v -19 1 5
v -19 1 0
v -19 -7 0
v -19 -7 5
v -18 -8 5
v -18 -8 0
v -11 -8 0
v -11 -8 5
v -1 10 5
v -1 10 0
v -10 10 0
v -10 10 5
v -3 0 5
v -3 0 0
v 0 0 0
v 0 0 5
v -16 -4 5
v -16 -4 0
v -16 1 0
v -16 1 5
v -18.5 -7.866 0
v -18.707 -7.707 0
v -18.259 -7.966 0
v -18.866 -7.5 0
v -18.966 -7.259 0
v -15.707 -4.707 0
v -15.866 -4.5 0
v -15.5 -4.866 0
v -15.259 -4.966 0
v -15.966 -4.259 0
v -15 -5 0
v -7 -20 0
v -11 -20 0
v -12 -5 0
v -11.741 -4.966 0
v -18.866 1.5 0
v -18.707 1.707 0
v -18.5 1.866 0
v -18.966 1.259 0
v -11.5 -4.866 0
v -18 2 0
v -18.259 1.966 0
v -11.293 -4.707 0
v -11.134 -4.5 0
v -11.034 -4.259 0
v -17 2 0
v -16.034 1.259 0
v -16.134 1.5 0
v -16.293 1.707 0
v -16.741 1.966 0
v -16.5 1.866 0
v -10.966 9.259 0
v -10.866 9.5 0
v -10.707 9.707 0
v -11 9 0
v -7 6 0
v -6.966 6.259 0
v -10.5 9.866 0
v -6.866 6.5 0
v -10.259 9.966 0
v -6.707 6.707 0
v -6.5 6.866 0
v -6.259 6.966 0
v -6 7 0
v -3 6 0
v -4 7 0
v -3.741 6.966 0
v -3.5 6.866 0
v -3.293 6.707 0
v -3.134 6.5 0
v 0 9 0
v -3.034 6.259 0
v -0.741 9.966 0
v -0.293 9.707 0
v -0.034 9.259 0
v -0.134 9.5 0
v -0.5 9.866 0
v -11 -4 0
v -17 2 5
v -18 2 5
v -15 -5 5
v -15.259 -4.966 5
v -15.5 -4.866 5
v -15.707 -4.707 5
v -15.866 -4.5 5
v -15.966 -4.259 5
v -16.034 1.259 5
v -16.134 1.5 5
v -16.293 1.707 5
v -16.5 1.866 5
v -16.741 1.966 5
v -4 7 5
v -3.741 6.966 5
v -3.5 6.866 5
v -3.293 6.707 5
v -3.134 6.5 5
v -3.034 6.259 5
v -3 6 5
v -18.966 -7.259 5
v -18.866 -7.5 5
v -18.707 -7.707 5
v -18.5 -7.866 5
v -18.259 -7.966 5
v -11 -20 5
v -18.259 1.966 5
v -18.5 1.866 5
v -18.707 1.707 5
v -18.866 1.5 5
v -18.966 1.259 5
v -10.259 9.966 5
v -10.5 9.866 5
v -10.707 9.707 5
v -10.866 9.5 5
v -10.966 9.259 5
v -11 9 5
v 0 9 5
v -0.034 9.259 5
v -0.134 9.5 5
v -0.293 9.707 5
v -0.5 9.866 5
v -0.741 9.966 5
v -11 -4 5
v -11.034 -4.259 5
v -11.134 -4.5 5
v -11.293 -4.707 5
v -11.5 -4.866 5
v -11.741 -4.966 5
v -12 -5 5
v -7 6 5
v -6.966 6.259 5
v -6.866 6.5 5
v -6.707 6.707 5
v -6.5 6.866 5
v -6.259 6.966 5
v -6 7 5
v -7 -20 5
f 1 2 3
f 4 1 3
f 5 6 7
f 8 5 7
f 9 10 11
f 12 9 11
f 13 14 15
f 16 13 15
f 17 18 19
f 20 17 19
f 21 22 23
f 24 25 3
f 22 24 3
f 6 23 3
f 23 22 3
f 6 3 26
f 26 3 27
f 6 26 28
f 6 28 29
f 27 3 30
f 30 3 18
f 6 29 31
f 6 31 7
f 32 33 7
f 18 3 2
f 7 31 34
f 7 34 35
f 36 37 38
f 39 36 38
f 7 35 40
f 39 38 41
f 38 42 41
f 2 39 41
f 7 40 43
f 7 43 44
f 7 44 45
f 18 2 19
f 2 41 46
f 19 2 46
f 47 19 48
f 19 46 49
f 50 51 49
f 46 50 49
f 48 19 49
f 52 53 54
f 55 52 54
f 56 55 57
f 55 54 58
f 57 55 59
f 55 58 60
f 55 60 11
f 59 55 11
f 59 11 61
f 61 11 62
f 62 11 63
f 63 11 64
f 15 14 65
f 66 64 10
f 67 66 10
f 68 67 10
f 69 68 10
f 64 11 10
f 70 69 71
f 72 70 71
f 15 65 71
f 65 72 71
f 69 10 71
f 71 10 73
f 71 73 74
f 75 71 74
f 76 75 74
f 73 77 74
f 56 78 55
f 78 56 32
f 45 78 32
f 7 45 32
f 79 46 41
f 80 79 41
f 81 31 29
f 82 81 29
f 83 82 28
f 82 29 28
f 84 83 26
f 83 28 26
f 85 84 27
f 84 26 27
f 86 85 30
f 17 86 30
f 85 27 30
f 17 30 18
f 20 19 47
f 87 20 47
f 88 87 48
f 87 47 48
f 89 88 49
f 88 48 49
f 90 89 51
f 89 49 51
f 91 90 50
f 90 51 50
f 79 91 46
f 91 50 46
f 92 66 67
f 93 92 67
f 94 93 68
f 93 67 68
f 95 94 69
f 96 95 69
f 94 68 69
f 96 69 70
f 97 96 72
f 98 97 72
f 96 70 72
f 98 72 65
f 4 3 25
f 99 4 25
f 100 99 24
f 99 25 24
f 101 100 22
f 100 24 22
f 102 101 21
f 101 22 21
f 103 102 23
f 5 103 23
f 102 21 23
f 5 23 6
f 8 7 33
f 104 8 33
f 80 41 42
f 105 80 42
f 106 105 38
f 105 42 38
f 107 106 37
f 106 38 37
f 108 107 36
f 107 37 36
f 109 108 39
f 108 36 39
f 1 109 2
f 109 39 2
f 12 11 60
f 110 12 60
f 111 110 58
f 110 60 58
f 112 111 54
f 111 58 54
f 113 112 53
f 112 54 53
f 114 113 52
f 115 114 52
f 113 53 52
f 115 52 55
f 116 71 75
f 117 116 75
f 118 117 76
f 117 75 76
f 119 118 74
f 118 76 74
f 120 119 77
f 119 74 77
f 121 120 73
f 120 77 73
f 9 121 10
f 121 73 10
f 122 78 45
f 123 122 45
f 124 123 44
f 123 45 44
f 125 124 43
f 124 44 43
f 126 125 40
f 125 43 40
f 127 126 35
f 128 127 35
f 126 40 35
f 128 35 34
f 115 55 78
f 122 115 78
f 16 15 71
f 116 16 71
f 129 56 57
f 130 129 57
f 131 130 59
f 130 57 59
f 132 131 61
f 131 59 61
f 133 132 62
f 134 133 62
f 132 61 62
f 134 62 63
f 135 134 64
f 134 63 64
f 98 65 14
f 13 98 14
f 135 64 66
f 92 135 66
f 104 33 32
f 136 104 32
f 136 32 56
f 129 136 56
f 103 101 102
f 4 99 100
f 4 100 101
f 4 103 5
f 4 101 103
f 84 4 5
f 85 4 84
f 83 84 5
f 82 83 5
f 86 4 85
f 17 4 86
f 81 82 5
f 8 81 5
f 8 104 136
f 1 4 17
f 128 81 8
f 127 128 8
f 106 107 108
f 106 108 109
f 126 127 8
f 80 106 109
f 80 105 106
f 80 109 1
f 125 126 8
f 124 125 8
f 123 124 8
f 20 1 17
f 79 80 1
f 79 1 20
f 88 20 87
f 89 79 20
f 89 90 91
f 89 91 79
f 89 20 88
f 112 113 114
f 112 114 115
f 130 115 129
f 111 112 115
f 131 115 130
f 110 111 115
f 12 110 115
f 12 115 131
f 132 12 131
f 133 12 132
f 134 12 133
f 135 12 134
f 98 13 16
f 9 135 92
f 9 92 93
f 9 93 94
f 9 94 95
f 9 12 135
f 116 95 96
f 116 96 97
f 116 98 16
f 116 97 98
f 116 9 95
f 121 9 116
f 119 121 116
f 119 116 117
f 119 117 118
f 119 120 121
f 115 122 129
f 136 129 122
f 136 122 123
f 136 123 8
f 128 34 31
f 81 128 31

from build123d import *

# Parameters (mm, degrees)
F1_DEPTH = 5


with BuildPart() as f1:
    # F0 (on Top) → F1 (new body)
    with BuildSketch(Plane.XY):
        with BuildLine():
            Line((-3, 0), (0, 0))
            Line((0, 0), (0, 9))
            ThreePointArc((0, 9), (-0.292893, 9.707107), (-1, 10))
            Line((-1, 10), (-10, 10))
            ThreePointArc((-10, 10), (-10.707107, 9.707107), (-11, 9))
            Line((-11, 9), (-11, -4))
            ThreePointArc((-11, -4), (-11.292893, -4.707107), (-12, -5))
            Line((-12, -5), (-15, -5))
            ThreePointArc((-15, -5), (-15.707107, -4.707107), (-16, -4))
            Line((-16, -4), (-16, 1))
            ThreePointArc((-16, 1), (-16.292893, 1.707107), (-17, 2))
            Line((-17, 2), (-18, 2))
            ThreePointArc((-18, 2), (-18.707107, 1.707107), (-19, 1))
            Line((-19, 1), (-19, -7))
            ThreePointArc((-19, -7), (-18.707107, -7.707107), (-18, -8))
            Line((-18, -8), (-11, -8))
            Line((-11, -8), (-11, -20))
            Line((-11, -20), (-7, -20))
            Line((-7, -20), (-7, 6))
            ThreePointArc((-7, 6), (-6.707107, 6.707107), (-6, 7))
            Line((-6, 7), (-4, 7))
            ThreePointArc((-4, 7), (-3.292893, 6.707107), (-3, 6))
            Line((-3, 6), (-3, 0))
        make_face()
    extrude(amount=F1_DEPTH)


solid = f1.part
